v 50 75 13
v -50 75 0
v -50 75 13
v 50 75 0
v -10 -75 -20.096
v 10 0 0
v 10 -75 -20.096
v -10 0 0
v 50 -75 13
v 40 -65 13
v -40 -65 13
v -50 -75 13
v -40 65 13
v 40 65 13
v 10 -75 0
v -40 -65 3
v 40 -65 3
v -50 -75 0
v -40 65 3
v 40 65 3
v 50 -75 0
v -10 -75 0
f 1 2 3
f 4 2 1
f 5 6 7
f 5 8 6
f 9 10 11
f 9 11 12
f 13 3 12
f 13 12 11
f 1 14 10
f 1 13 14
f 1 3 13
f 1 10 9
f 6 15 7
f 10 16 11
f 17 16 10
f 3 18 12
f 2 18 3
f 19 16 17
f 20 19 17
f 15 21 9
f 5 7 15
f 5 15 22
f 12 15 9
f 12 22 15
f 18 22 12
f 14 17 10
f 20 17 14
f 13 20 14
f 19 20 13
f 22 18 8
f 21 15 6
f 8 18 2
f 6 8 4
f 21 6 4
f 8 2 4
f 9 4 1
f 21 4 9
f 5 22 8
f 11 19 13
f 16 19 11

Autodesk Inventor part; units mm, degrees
ref_plane "YZ Plane" through (0, 0, 0) normal (1, 0, 0) x (0, 1, 0)
ref_plane "XZ Plane" through (0, 0, 0) normal (0, 1, 0) x (-1, 0, 0)
ref_plane "XY Plane" through (0, 0, 0) normal (0, 0, 1) x (1, 0, 0)
sketch "Эскиз1" plane through (0, 0, 0) normal (0, 0, 1) x (1, 0, 0)
  line L0 (50, -75) -> (-50, -75)
  line L1 (-50, -75) -> (-50, 75)
  line L2 (-50, 75) -> (50, 75)
  line L3 (50, 75) -> (50, -75)
  line L4 (50, -75) -> (-50, 75) construction
  line L5 (-50, -75) -> (50, 75) construction
  point P0 (0, 0)
  dimension "d0" = 100
  dimension "d1" = 150
extrude "Выдавливание1" add sketch "Эскиз1" along normal blind 3
sketch "Эскиз2" plane through (0, 0, 3) normal (0, 0, 1) x (1, 0, 0)
  line L0 (-50, 75) -> (-50, -75) projected
  line L1 (50, -75) -> (-50, -75)
  line L2 (-50, -75) -> (-50, 75)
  line L3 (-50, 75) -> (50, 75)
  line L4 (50, 75) -> (50, -75)
  line L5 (50, -75) -> (-50, 75) construction
  line L6 (-50, -75) -> (50, 75) construction
  line L7 (-50.1414, 75) -> (-50.1414, -75)
  line L8 (40, 65) -> (-40, 65)
  line L9 (-40, 65) -> (-40, -65)
  line L10 (-40, -65) -> (40, -65)
  line L11 (40, -65) -> (40, 65)
  point P0 (0, 0)
  dimension "d4" = 10
extrude "Выдавливание2" add sketch "Эскиз2" along normal blind 10
sketch "Эскиз3" plane through (0, 0, 0) normal (1, 0, 0) x (0, 1, 0)
  line L0 (0, 0) -> (-75, -20.0962)
  line L1 (-75, 0) -> (75, 0) projected
  line L2 (-75, -20.0962) -> (-75, 0)
  line L3 (-75, 0) -> (0, 0)
  dimension "d7" = 15
extrude "Выдавливание3" add sketch "Эскиз3" along normal mid plane 20
properties part number "project2"
